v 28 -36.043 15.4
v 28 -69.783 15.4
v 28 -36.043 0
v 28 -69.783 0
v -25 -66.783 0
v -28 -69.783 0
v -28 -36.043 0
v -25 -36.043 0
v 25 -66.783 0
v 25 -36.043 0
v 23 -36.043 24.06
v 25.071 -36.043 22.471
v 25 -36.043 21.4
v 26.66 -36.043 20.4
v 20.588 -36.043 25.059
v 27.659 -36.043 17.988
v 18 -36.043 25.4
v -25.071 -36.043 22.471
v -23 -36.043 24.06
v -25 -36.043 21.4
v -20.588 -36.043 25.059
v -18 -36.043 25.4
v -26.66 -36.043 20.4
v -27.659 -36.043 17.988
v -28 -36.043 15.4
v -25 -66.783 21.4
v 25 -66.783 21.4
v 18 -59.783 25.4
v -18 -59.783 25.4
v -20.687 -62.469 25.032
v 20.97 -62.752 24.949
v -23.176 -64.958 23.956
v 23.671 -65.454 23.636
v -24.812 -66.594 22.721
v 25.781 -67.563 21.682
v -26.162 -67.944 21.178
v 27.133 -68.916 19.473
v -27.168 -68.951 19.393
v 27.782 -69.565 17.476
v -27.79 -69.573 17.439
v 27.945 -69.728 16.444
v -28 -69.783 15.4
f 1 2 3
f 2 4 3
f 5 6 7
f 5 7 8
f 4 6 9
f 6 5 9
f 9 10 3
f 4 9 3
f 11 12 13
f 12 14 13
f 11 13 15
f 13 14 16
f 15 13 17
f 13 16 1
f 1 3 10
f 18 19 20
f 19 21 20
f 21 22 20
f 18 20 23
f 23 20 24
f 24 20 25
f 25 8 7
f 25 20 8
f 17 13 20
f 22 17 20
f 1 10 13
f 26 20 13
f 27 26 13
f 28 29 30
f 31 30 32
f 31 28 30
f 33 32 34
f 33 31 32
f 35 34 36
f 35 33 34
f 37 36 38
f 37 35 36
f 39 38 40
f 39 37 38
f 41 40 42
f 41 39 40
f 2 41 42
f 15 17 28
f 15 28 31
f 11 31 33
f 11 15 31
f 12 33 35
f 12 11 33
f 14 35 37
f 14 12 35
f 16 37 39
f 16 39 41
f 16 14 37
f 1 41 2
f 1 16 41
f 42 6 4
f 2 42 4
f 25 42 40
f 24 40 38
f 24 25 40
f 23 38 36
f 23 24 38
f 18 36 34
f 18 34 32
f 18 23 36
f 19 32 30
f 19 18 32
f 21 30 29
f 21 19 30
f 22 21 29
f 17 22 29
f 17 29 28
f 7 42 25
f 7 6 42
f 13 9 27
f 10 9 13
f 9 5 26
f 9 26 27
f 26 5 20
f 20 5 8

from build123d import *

# Parameters (mm, degrees)
SKETCH1_W           = 56
SKETCH1_H           = 36.73970361
SKETCH1_W_2         = 50
SKETCH1_H_2         = 30.73970361
BOSS_EXTRUDE1_DEPTH = 25.4
SKETCH2_W           = 56
SKETCH2_H           = 36.73970361
BOSS_EXTRUDE2_DEPTH = 4
FILLET1_R           = 10
SKETCH3_W           = 56
SKETCH3_H           = 3
CUT_EXTRUDE1_DEPTH  = 28


with BuildPart() as part:
    # Sketch1 → Boss-Extrude1 (new body)
    with BuildSketch(Plane.XY):
        with Locations((0, -51.412888934)):
            Rectangle(SKETCH1_W, SKETCH1_H)
        with Locations((0, -51.412888934)):
            Rectangle(SKETCH1_W_2, SKETCH1_H_2, mode=Mode.SUBTRACT)
    extrude(amount=BOSS_EXTRUDE1_DEPTH)

    # Sketch2 → Boss-Extrude2 (add)
    with BuildSketch(Plane.XY.offset(25.4)):
        with Locations((0, -51.412888934)):
            Rectangle(SKETCH2_W, SKETCH2_H)
    extrude(amount=-BOSS_EXTRUDE2_DEPTH)

    # Fillet1
    fillet1_edges = [part.edges().sort_by_distance(p)[0] for p in [
        (28, -51.412888934, 25.4),
        (-28, -51.412888934, 25.4),
        (0, -69.782740739, 25.4),
    ]]
    fillet(fillet1_edges, radius=FILLET1_R)

    # Sketch3 → Cut-Extrude1 (cut)
    with BuildSketch(Plane(origin=(0, 0, 0), x_dir=(-1, 0, 0), z_dir=(0, 0, -1))):
        with Locations((0, -34.543037129)):
            Rectangle(SKETCH3_W, SKETCH3_H)
    extrude(amount=-CUT_EXTRUDE1_DEPTH, mode=Mode.SUBTRACT)


solid = part.part
